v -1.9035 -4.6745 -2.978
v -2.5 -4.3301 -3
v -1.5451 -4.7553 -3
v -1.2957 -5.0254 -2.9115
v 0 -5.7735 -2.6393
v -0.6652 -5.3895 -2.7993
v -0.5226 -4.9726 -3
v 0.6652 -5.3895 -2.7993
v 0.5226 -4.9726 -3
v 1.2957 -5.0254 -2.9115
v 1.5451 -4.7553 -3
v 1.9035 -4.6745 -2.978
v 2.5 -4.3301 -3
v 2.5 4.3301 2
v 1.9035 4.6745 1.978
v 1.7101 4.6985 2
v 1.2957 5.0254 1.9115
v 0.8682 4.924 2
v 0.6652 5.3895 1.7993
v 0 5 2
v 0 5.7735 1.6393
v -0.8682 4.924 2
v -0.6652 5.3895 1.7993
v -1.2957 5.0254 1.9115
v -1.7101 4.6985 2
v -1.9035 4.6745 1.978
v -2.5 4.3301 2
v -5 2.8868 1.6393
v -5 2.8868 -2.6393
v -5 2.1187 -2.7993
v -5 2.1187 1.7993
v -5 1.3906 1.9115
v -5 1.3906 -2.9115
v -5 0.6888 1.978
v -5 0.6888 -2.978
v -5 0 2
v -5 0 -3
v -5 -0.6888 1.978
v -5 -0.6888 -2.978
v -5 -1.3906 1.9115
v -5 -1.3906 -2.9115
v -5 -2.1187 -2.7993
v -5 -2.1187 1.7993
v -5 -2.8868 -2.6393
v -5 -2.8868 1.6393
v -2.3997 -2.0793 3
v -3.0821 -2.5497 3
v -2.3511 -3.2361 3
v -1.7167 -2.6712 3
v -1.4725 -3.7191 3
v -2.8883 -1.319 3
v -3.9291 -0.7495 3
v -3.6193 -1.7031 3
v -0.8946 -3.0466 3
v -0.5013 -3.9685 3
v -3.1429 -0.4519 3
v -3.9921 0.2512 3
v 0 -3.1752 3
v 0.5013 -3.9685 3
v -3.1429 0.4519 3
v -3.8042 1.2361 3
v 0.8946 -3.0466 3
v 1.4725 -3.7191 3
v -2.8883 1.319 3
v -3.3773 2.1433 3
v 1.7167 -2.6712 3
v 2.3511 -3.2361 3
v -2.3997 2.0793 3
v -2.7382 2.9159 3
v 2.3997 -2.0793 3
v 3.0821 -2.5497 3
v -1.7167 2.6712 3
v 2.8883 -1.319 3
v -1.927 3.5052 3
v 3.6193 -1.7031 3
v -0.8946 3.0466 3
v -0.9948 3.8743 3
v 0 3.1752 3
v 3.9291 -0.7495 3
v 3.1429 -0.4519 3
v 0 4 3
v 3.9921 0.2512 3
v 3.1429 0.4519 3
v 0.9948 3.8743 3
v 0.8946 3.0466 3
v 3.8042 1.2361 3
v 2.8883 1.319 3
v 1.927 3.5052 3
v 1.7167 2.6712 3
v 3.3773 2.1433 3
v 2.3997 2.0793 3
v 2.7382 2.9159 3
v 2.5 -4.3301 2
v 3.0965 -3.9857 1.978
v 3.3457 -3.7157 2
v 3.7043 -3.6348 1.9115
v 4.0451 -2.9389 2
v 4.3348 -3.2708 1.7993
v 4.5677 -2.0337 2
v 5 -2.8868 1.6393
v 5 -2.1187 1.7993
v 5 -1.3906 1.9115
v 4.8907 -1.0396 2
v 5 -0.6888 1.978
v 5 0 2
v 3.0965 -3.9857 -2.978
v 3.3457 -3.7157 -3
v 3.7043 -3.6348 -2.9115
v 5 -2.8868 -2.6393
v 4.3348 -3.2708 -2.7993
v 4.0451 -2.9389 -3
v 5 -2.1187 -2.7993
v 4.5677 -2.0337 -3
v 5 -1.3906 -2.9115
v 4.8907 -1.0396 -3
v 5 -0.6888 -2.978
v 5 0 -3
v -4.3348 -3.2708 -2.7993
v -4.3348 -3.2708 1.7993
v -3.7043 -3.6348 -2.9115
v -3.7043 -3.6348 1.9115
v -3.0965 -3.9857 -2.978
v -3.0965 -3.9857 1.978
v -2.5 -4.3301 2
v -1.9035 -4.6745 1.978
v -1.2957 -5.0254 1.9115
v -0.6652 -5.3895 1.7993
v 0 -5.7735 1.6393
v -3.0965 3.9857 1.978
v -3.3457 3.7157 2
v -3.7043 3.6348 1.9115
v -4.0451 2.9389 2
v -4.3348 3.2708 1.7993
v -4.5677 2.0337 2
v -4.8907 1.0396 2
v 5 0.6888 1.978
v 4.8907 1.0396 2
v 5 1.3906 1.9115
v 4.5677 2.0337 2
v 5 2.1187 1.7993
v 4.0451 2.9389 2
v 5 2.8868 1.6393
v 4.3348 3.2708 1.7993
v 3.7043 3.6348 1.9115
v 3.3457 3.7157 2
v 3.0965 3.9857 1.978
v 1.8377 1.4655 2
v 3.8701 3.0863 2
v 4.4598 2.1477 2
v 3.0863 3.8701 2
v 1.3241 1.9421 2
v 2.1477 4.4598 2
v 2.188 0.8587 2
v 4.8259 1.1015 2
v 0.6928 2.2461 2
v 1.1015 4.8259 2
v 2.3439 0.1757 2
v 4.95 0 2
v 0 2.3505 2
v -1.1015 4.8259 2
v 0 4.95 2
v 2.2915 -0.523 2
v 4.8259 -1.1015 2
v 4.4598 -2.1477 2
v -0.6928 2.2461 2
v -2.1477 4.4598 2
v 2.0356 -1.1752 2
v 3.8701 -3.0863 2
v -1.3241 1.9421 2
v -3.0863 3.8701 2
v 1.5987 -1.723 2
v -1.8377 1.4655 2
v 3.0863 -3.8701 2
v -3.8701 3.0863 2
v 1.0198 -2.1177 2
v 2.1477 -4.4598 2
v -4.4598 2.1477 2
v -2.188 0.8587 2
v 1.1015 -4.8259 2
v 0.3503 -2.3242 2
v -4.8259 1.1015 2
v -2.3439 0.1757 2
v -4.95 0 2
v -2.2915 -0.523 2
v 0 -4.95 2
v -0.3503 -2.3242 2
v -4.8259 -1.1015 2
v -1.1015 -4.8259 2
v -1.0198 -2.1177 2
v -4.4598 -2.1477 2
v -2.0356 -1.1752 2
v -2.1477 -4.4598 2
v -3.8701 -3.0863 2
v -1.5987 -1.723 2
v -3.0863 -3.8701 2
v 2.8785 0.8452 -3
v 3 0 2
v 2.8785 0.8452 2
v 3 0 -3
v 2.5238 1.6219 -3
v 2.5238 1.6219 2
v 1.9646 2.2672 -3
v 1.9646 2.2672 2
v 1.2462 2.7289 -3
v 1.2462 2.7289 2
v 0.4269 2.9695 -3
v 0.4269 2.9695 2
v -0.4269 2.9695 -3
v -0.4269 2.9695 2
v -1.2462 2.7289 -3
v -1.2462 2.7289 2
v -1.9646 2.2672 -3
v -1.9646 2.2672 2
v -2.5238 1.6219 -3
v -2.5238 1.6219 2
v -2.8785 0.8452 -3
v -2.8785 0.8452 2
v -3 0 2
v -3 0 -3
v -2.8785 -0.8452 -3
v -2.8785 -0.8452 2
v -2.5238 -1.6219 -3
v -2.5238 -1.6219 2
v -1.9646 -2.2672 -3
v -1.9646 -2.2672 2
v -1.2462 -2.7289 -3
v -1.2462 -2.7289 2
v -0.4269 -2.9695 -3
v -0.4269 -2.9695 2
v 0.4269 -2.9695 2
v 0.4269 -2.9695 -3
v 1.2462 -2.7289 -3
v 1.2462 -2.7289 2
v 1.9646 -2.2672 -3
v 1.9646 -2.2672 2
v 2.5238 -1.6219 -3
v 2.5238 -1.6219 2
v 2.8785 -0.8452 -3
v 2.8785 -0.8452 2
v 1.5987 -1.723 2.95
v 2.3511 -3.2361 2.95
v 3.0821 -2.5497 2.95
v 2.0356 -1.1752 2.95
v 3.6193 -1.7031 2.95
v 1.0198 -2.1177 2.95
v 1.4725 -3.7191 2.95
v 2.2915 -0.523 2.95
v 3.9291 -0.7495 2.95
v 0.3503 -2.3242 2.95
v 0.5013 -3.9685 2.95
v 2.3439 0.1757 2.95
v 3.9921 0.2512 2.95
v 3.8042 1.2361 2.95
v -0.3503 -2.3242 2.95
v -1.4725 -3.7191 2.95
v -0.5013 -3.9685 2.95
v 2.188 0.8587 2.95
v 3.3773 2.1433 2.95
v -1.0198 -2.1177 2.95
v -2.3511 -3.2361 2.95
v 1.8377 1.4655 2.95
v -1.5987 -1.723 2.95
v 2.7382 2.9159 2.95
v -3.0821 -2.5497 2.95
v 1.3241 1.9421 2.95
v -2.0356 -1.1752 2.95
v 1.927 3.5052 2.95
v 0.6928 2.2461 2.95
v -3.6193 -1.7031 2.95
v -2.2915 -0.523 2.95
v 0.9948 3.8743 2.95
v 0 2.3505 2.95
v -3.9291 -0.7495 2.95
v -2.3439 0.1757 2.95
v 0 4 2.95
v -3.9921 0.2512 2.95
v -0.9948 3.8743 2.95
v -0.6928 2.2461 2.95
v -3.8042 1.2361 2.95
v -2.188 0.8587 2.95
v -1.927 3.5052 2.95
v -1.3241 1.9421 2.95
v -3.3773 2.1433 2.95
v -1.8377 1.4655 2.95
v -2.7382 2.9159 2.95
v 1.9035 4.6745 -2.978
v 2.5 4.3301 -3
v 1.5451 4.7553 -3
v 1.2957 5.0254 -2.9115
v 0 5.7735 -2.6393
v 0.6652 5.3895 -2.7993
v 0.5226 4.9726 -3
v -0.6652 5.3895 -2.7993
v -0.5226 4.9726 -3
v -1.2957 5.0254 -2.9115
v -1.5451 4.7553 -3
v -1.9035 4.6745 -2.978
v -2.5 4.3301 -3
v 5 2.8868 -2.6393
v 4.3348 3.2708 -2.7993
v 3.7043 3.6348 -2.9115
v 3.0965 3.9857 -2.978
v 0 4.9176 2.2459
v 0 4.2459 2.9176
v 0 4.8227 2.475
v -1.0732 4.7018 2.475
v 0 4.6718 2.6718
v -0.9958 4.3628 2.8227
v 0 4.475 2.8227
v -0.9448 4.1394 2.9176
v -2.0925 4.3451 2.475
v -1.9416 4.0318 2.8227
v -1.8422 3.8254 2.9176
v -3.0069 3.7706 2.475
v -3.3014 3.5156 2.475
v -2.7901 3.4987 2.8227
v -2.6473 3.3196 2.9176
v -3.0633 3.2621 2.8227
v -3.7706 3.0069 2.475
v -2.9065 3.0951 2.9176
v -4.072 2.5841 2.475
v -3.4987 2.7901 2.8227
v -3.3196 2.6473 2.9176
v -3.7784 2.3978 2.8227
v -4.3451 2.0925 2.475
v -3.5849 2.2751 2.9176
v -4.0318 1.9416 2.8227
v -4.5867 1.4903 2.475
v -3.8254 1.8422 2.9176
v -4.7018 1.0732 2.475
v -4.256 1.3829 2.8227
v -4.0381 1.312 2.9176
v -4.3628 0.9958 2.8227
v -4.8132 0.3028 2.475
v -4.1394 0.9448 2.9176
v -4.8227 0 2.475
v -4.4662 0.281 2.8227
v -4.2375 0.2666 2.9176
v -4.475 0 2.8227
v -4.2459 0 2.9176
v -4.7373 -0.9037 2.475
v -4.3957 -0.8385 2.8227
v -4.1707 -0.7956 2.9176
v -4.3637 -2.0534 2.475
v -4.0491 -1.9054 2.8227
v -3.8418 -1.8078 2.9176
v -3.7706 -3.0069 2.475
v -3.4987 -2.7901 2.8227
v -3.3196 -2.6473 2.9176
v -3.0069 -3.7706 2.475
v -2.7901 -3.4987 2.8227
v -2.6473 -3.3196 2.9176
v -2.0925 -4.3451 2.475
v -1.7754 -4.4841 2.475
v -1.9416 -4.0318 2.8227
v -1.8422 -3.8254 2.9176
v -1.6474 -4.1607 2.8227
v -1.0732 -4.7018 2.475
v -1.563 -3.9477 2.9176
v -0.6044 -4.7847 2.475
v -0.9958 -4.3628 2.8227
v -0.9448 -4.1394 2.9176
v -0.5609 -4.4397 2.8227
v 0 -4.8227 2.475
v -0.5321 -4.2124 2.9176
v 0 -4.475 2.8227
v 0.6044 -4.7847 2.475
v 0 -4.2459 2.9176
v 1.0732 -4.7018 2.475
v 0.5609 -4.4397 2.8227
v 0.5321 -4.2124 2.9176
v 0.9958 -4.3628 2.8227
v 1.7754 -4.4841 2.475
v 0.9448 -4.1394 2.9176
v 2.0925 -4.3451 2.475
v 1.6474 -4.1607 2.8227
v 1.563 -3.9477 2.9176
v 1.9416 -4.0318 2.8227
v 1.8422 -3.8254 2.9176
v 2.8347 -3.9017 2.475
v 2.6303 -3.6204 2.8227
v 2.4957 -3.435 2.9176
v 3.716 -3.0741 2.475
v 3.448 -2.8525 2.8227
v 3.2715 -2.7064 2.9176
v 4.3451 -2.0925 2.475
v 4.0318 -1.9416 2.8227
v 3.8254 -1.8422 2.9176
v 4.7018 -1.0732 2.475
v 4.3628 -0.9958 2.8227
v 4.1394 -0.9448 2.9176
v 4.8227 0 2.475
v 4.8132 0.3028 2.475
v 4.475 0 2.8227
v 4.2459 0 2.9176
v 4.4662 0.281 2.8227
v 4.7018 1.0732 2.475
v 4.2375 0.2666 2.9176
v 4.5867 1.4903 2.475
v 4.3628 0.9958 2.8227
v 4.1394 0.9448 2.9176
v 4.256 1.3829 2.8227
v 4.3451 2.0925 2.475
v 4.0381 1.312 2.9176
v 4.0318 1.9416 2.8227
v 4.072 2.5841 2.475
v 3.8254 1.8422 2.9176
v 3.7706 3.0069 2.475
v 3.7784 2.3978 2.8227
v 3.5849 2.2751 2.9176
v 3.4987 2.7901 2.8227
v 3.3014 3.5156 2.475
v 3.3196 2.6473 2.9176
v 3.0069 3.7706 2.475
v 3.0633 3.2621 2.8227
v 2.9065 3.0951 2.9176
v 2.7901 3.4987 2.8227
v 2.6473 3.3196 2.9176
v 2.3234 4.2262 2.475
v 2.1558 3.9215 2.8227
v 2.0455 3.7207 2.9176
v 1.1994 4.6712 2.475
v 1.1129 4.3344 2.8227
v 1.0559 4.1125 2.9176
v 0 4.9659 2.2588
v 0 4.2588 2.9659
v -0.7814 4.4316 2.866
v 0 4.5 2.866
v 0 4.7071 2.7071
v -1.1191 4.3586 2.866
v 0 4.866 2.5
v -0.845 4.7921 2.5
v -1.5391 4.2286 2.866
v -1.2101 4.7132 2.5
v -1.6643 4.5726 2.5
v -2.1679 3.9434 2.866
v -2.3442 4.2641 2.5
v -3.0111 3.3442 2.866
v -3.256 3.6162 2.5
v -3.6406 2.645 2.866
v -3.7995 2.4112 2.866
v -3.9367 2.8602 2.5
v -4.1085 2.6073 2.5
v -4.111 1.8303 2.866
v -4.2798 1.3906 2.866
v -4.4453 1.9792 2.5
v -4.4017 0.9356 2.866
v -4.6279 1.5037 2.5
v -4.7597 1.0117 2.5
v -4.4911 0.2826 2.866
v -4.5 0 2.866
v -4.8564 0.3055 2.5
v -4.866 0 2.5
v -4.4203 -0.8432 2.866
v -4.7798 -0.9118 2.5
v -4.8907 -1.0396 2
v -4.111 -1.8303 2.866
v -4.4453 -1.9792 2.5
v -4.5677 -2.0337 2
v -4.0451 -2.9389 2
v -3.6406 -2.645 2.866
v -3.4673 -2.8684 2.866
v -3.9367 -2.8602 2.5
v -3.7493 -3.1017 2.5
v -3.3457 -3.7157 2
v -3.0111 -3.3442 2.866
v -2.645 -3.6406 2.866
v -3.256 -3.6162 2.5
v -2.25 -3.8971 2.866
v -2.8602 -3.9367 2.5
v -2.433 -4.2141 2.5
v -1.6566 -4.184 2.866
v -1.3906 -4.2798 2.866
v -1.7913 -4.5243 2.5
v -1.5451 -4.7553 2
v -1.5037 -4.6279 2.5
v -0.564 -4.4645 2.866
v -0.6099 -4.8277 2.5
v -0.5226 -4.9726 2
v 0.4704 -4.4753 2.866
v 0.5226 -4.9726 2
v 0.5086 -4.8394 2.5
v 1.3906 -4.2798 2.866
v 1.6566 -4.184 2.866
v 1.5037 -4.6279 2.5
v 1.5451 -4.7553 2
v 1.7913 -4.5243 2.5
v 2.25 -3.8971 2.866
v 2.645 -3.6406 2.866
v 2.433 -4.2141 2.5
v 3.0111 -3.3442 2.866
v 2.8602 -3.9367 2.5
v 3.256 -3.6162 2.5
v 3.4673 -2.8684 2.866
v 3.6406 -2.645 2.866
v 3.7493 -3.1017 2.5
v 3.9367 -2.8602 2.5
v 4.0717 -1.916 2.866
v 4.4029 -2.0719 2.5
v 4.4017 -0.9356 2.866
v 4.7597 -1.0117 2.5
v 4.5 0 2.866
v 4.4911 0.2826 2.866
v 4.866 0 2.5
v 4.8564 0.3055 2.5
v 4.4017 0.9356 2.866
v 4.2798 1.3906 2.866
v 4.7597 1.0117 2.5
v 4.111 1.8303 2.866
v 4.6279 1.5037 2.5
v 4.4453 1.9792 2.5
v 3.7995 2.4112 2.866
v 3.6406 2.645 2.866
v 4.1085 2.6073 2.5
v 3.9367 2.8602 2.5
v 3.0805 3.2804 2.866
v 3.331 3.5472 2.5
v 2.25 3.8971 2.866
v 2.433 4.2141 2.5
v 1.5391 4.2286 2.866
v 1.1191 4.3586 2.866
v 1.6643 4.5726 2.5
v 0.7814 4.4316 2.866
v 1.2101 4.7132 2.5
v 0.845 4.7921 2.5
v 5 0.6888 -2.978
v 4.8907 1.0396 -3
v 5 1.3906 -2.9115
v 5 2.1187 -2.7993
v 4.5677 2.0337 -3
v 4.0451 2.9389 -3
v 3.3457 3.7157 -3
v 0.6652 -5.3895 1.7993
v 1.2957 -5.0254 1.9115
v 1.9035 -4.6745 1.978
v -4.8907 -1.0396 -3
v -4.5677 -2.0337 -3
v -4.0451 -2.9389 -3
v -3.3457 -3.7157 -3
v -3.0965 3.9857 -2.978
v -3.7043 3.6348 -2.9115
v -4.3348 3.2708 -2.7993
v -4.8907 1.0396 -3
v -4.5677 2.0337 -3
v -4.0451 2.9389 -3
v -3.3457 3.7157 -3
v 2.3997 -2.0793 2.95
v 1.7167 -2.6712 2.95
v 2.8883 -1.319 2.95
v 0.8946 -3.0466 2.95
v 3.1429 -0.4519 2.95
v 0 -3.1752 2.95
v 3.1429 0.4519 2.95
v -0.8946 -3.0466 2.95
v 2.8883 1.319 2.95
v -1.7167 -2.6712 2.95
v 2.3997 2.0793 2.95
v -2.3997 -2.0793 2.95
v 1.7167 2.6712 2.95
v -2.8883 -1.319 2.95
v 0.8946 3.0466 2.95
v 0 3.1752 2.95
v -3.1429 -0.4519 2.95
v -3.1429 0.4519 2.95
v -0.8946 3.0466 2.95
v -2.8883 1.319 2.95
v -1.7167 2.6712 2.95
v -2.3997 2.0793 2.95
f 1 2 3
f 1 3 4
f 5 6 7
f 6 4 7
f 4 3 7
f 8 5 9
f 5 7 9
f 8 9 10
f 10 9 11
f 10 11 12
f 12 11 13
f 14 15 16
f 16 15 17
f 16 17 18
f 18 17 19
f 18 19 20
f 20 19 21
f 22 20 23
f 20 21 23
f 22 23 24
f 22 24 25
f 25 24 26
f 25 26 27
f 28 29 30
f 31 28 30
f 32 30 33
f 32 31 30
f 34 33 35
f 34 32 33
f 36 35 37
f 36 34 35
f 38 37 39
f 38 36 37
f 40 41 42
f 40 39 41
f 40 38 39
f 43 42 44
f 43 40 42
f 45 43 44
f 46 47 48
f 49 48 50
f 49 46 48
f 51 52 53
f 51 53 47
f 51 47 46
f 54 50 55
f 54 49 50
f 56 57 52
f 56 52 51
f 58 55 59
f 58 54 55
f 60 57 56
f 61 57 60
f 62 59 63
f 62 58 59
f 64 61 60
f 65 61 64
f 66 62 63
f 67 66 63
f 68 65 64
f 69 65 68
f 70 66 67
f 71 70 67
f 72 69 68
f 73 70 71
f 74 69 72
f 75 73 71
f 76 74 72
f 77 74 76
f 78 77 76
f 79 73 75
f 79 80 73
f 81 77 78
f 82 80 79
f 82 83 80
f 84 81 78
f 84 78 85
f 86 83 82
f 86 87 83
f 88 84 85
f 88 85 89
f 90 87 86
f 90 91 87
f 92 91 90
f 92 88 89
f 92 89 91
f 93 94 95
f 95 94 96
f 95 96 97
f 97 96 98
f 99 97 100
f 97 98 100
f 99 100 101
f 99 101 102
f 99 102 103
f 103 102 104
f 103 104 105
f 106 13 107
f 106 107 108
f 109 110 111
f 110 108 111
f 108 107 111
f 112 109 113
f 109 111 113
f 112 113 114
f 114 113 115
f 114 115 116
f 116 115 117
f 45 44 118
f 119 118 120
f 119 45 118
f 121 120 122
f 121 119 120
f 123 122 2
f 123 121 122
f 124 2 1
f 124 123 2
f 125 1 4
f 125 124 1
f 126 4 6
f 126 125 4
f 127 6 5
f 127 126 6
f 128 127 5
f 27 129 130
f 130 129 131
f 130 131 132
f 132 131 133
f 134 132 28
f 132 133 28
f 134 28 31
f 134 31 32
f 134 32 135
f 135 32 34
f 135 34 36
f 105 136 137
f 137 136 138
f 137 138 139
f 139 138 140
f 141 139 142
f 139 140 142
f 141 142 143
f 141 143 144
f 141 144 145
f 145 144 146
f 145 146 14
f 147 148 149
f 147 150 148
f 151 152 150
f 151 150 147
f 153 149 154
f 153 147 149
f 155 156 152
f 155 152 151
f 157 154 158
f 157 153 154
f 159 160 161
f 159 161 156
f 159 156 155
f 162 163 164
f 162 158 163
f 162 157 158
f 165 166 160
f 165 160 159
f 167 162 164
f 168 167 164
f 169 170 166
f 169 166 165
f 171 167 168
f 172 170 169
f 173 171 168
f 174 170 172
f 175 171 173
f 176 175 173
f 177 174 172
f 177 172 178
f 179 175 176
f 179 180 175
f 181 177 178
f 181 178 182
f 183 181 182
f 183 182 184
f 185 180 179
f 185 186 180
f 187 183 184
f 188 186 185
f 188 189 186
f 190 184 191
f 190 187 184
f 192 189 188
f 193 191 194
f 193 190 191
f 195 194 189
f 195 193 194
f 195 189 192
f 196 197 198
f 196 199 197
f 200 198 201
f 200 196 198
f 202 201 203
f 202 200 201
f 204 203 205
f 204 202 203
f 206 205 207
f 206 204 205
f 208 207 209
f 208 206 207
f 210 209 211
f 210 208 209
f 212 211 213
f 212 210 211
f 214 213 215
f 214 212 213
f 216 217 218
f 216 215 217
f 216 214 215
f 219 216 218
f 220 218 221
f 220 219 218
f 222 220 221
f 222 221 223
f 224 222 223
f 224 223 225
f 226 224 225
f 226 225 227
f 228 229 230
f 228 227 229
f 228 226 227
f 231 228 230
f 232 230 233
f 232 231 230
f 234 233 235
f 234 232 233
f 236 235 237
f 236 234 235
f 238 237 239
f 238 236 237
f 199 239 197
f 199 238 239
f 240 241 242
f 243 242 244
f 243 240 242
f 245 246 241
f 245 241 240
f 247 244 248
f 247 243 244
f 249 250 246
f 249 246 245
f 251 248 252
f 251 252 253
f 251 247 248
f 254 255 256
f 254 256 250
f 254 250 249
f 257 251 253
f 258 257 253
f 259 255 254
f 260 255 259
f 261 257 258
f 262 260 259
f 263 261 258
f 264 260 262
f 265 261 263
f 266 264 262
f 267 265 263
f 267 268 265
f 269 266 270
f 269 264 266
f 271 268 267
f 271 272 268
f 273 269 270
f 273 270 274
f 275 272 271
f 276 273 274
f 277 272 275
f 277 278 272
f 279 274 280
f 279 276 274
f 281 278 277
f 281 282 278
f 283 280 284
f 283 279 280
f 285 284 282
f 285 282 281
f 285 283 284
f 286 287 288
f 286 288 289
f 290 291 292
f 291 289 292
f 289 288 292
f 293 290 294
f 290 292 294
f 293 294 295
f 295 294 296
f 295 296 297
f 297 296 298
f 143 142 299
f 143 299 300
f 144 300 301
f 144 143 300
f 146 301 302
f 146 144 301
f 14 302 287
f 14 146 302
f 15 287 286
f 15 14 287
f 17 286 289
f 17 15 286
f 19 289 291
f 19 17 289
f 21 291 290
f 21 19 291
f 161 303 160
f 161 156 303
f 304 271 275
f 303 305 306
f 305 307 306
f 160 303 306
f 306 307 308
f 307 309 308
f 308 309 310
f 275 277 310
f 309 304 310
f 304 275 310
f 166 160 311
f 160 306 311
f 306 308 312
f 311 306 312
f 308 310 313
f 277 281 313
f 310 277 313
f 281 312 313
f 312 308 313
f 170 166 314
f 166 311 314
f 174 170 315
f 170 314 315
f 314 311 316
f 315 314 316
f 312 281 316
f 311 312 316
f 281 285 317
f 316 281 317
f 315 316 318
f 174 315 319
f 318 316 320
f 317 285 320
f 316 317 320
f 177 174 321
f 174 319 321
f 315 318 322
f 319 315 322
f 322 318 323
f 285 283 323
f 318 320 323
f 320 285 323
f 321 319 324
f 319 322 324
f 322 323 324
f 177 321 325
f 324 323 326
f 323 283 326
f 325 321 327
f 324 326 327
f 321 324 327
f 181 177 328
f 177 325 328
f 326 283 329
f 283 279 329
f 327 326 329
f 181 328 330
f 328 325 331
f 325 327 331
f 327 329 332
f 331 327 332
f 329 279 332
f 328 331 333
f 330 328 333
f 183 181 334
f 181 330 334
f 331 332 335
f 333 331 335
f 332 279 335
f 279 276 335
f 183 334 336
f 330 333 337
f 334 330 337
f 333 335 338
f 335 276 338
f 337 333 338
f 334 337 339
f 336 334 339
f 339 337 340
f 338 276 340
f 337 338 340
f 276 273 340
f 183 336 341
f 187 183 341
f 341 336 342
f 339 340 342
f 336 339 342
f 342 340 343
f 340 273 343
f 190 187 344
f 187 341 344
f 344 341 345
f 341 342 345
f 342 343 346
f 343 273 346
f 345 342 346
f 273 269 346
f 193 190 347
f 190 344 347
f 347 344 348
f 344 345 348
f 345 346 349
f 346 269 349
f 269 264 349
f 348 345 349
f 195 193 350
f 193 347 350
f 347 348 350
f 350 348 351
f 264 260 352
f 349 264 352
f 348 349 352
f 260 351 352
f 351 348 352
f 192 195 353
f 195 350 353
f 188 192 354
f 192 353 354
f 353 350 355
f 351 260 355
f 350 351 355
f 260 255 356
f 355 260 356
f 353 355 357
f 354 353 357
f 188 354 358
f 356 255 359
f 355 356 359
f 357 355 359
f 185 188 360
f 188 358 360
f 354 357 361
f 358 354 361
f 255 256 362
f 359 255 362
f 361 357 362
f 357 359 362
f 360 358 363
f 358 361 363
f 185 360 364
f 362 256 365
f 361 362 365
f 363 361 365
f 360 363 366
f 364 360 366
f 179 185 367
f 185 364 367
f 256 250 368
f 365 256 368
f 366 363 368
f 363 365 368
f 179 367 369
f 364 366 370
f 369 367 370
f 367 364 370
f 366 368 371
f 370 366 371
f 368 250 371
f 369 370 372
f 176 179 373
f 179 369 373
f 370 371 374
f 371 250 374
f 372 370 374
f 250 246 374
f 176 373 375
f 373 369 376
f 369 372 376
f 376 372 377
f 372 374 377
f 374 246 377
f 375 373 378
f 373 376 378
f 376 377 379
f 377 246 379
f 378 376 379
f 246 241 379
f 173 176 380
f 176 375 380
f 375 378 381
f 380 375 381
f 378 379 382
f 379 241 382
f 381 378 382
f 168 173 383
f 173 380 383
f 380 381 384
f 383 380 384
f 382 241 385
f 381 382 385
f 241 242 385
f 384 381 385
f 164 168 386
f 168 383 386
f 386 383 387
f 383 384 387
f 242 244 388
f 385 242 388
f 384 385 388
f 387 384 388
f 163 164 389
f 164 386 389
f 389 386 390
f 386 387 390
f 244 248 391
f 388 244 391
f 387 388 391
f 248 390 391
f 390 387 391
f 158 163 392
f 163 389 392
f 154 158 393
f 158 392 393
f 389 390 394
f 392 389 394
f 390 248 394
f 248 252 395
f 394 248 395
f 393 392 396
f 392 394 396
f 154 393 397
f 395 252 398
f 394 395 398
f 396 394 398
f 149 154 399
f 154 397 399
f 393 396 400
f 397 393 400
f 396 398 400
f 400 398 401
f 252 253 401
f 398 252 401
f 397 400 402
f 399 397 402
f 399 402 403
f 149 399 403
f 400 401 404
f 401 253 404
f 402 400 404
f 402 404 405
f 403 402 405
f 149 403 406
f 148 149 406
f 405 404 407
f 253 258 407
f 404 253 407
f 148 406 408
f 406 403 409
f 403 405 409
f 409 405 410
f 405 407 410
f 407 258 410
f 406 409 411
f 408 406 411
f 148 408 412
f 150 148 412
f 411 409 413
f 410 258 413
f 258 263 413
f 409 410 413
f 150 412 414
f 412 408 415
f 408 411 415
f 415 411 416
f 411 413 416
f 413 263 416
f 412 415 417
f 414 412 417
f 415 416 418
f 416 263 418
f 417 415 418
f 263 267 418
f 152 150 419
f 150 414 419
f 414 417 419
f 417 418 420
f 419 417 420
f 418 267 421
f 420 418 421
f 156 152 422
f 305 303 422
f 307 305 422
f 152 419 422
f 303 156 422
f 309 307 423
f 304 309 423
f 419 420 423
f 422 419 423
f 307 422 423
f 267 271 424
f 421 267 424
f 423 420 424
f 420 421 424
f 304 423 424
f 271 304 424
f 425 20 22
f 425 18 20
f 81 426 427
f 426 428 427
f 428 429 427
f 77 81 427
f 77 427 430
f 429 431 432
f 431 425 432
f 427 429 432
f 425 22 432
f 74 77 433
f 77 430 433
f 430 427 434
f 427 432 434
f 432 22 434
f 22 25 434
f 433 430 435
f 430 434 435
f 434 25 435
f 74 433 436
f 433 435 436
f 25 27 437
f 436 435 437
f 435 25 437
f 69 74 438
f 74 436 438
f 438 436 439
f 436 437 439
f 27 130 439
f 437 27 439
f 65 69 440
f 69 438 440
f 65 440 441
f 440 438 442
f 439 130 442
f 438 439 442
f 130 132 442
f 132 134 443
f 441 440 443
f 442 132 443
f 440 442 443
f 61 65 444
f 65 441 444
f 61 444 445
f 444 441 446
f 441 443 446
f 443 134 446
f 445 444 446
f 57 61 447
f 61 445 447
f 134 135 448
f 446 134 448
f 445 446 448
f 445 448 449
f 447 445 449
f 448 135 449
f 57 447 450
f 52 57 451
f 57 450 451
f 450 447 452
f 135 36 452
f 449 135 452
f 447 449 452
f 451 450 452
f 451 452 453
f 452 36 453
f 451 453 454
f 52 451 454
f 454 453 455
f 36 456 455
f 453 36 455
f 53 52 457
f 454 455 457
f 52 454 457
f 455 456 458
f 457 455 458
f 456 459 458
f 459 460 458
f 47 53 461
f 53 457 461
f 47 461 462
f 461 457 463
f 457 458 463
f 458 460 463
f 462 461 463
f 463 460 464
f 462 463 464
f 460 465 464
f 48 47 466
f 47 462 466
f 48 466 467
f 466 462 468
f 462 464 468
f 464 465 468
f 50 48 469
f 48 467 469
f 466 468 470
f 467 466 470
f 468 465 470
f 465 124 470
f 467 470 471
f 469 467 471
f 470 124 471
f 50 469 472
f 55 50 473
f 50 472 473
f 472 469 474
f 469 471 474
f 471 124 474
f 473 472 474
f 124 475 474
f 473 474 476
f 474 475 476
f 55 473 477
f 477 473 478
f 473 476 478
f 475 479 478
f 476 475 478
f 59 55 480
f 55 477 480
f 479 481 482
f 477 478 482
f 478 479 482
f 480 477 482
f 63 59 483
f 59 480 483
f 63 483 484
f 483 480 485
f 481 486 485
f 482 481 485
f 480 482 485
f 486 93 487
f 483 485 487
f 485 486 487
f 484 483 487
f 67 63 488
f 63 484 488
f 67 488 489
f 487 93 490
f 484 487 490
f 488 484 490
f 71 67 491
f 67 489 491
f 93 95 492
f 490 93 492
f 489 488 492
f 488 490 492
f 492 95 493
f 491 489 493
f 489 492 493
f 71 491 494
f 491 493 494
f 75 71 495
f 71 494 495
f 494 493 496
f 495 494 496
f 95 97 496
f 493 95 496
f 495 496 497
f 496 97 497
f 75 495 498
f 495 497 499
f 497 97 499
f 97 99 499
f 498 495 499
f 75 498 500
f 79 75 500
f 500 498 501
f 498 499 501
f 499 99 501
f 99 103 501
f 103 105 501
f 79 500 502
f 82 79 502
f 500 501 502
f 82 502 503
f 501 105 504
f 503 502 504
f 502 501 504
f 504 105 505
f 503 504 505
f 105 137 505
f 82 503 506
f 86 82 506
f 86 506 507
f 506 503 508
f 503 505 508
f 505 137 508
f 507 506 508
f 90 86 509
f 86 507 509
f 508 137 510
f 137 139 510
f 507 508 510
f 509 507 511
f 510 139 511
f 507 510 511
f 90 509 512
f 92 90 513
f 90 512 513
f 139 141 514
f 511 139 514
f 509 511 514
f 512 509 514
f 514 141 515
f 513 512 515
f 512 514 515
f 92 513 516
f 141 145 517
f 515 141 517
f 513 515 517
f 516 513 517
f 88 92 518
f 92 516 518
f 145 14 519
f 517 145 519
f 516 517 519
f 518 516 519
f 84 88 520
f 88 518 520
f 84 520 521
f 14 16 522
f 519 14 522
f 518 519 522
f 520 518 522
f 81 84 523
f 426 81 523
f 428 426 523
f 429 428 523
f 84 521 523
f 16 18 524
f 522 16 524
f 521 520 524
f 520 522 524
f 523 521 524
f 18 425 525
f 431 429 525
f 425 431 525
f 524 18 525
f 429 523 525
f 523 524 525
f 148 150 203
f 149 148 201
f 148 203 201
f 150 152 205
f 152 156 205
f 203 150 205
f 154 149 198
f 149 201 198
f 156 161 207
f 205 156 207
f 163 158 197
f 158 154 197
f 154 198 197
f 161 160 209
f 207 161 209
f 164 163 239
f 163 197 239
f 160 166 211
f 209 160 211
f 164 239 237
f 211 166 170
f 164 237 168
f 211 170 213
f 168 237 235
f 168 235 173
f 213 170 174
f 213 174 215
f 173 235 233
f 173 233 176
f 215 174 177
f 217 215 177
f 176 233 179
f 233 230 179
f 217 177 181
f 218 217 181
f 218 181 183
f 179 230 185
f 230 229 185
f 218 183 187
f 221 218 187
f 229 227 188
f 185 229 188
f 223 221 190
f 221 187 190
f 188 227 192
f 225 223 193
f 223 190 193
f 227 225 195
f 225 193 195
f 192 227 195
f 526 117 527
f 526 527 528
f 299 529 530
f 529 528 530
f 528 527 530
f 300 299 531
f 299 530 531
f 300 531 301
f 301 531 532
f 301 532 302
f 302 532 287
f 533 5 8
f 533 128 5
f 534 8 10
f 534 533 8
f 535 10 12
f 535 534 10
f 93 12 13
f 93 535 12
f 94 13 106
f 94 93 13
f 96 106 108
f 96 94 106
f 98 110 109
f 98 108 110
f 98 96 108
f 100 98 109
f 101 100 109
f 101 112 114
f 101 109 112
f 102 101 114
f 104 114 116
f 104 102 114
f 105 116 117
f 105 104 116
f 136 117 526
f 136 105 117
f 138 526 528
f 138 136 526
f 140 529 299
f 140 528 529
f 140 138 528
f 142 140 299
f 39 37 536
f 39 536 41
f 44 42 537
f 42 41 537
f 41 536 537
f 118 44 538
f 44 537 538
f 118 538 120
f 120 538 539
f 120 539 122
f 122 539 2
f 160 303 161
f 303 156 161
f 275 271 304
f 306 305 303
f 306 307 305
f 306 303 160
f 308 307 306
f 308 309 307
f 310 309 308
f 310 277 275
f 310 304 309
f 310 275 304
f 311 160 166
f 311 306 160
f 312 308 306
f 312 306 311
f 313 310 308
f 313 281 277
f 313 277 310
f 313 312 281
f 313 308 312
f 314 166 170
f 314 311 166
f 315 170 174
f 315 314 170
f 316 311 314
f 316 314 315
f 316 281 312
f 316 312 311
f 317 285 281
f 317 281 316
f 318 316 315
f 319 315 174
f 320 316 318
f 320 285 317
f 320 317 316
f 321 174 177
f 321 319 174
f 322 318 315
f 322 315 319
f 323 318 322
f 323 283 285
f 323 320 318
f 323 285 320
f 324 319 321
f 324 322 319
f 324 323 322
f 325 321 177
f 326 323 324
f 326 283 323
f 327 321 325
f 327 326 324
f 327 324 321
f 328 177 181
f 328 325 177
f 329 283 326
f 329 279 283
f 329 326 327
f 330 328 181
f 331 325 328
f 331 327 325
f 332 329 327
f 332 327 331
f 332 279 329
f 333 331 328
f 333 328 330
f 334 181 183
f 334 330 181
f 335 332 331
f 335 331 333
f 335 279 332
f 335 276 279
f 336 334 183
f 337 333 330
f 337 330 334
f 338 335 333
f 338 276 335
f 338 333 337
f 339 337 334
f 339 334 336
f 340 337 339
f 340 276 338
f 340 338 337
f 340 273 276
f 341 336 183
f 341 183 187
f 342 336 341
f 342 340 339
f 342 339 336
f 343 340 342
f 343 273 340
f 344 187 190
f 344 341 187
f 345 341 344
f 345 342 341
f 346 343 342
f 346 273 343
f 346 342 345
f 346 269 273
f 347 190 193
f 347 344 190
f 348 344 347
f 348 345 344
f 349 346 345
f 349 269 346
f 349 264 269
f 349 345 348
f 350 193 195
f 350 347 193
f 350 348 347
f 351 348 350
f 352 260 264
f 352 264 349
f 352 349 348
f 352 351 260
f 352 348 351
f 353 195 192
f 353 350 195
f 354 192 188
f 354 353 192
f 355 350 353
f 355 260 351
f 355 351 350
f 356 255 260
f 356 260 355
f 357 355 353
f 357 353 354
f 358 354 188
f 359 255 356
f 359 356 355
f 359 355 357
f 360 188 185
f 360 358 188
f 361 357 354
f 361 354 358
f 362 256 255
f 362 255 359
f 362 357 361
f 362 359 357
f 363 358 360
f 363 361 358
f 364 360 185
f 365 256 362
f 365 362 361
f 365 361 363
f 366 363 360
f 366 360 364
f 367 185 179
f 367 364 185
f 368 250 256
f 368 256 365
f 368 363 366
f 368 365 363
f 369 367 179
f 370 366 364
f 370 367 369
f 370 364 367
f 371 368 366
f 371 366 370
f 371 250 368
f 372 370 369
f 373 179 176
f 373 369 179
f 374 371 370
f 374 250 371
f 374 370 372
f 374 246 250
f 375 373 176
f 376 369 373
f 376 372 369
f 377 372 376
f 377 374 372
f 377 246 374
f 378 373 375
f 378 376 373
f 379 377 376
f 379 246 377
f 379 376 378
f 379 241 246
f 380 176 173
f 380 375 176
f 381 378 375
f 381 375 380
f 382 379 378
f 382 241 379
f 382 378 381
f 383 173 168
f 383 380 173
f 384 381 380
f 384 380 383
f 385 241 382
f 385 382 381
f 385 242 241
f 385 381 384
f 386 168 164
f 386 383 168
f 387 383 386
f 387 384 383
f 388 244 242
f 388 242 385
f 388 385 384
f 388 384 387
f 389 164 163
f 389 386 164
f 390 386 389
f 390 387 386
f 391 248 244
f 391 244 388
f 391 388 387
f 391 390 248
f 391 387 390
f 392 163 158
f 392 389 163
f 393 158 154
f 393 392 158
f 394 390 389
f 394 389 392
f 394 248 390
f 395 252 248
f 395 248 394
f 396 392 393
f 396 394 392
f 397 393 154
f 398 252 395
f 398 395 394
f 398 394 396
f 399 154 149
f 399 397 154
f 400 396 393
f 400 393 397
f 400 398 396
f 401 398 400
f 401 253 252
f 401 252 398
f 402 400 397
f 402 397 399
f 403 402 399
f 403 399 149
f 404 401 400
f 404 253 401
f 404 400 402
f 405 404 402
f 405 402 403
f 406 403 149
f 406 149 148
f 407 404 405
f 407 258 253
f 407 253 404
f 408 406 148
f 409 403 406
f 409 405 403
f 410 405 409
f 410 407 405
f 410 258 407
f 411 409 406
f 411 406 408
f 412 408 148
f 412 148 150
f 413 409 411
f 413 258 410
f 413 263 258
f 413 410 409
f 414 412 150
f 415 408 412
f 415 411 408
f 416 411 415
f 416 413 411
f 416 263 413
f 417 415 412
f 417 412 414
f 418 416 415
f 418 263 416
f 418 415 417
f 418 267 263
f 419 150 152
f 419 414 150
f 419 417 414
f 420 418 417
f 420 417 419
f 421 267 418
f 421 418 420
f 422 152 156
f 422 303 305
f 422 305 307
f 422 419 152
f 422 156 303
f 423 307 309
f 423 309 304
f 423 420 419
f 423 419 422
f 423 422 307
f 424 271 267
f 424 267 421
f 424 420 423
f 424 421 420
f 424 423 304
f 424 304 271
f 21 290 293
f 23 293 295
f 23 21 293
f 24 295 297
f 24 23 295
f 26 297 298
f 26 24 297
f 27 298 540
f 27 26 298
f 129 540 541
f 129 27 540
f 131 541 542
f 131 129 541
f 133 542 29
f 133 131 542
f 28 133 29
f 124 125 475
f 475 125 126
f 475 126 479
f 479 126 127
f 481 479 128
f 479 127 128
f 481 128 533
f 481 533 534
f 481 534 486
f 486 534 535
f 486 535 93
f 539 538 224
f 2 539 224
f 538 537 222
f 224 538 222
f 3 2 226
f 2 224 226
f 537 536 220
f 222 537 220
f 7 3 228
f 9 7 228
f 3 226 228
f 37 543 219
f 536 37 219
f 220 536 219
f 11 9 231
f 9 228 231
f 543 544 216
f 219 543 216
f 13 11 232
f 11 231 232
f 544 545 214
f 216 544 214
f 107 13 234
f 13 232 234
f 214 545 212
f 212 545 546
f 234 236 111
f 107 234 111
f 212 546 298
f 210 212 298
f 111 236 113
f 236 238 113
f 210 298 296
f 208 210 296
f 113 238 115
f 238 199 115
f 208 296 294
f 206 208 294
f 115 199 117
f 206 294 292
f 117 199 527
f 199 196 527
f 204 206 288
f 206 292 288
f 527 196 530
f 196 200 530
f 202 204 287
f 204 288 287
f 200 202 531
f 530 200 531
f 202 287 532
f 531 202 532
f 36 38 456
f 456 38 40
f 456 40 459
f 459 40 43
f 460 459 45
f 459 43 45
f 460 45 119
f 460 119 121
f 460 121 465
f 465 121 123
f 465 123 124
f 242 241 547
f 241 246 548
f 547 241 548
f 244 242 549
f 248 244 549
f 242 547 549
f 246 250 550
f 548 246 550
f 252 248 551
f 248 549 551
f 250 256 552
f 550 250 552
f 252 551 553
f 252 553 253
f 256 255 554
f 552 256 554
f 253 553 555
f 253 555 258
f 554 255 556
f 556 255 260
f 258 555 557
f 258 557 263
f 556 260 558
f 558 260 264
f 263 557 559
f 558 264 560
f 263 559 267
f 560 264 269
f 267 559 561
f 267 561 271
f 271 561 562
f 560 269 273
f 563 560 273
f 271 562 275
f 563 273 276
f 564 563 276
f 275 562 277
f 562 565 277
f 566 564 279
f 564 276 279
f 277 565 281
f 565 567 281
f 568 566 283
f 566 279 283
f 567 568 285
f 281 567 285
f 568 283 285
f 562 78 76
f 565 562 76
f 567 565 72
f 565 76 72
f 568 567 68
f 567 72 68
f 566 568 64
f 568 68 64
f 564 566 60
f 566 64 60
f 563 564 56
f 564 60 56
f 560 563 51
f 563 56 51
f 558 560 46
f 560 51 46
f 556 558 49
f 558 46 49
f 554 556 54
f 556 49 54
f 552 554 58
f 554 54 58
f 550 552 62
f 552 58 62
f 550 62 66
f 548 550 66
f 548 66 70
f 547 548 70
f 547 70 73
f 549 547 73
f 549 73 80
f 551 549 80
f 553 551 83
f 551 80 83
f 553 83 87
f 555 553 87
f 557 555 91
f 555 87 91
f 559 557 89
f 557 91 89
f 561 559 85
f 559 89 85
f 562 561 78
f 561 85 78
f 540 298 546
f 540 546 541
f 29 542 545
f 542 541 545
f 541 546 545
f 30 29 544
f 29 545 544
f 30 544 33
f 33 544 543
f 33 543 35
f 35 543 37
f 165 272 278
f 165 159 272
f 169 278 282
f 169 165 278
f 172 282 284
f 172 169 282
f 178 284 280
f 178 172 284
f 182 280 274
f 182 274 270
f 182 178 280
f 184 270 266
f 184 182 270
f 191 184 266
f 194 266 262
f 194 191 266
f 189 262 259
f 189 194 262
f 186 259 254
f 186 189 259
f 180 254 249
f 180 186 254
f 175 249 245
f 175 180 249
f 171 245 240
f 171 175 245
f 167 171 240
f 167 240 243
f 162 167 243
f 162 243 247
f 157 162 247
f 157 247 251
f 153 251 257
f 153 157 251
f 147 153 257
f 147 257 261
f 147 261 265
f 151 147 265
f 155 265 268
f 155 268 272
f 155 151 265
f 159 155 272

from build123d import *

# Parameters (mm, degrees)
SKETCH3_R           = 3
BOSS_EXTRUDE1_DEPTH = 3


with BuildPart() as part:
    # Sketch3 → Boss-Extrude1 (new body, symmetric)
    with BuildSketch(Plane.XY):
        Polygon((0, -5.773502692), (5, -2.886751346), (5, 2.886751346), (0, 5.773502692), (-5, 2.886751346), (-5, -2.886751346), align=None)
        Circle(SKETCH3_R, mode=Mode.SUBTRACT)
    extrude(amount=BOSS_EXTRUDE1_DEPTH, both=True)

    # Sketch4 → Cut-Revolve1 (revolve, cut)
    with BuildSketch(Plane(origin=(0, 0, 0), x_dir=(0, 0, -1), z_dir=(1, 0, 0))):
        with BuildLine():
            Line((4.27, 7.043502692), (-4.27, 7.043502692))
            Line((-4.27, 7.043502692), (-4.27, 4))
            Line((-4.27, 4), (-3, 4))
            ThreePointArc((-3, 4), (-2.707106781, 4.707106781), (-2, 5))
            Line((-2, 5), (-1.639309771, 5.773502692))
            Line((-1.639309771, 5.773502692), (2.639309771, 5.773502692))
            Line((2.639309771, 5.773502692), (3, 5))
            Line((3, 5), (3, 0))
            Line((3, 0), (4.27, 0))
            Line((4.27, 0), (4.27, 7.043502692))
        make_face()
        with BuildLine():
            Line((-4.27, 3.175240474), (-4.27, 0))
            Line((-4.27, 0), (-2, 0))
            Line((-2, 0), (-2, 4.95))
            ThreePointArc((-2, 4.95), (-2.671751442, 4.671751442), (-2.95, 4))
            Line((-2.95, 4), (-2.95, 3.175240474))
            Line((-2.95, 3.175240474), (-4.27, 3.175240474))
        make_face()
    revolve(axis=Axis((0, 0, -3), (0, 0, 1)), mode=Mode.SUBTRACT)


with BuildPart() as body_2:
    # Sketch5 → Revolve1 (revolve)
    with BuildSketch(Plane(origin=(0, 0, 0), x_dir=(0, 0, -1), z_dir=(1, 0, 0))):
        with BuildLine():
            Line((-2.95, 4), (-2.95, 2.350480947))
            Line((-2.95, 2.350480947), (-2, 2.350480947))
            Line((-2, 2.350480947), (-2, 4.95))
            ThreePointArc((-2, 4.95), (-2.671751442, 4.671751442), (-2.95, 4))
        make_face()
    revolve(axis=Axis((0, 0, -3), (0, 0, 1)))


solid = Compound([part.part, body_2.part])
